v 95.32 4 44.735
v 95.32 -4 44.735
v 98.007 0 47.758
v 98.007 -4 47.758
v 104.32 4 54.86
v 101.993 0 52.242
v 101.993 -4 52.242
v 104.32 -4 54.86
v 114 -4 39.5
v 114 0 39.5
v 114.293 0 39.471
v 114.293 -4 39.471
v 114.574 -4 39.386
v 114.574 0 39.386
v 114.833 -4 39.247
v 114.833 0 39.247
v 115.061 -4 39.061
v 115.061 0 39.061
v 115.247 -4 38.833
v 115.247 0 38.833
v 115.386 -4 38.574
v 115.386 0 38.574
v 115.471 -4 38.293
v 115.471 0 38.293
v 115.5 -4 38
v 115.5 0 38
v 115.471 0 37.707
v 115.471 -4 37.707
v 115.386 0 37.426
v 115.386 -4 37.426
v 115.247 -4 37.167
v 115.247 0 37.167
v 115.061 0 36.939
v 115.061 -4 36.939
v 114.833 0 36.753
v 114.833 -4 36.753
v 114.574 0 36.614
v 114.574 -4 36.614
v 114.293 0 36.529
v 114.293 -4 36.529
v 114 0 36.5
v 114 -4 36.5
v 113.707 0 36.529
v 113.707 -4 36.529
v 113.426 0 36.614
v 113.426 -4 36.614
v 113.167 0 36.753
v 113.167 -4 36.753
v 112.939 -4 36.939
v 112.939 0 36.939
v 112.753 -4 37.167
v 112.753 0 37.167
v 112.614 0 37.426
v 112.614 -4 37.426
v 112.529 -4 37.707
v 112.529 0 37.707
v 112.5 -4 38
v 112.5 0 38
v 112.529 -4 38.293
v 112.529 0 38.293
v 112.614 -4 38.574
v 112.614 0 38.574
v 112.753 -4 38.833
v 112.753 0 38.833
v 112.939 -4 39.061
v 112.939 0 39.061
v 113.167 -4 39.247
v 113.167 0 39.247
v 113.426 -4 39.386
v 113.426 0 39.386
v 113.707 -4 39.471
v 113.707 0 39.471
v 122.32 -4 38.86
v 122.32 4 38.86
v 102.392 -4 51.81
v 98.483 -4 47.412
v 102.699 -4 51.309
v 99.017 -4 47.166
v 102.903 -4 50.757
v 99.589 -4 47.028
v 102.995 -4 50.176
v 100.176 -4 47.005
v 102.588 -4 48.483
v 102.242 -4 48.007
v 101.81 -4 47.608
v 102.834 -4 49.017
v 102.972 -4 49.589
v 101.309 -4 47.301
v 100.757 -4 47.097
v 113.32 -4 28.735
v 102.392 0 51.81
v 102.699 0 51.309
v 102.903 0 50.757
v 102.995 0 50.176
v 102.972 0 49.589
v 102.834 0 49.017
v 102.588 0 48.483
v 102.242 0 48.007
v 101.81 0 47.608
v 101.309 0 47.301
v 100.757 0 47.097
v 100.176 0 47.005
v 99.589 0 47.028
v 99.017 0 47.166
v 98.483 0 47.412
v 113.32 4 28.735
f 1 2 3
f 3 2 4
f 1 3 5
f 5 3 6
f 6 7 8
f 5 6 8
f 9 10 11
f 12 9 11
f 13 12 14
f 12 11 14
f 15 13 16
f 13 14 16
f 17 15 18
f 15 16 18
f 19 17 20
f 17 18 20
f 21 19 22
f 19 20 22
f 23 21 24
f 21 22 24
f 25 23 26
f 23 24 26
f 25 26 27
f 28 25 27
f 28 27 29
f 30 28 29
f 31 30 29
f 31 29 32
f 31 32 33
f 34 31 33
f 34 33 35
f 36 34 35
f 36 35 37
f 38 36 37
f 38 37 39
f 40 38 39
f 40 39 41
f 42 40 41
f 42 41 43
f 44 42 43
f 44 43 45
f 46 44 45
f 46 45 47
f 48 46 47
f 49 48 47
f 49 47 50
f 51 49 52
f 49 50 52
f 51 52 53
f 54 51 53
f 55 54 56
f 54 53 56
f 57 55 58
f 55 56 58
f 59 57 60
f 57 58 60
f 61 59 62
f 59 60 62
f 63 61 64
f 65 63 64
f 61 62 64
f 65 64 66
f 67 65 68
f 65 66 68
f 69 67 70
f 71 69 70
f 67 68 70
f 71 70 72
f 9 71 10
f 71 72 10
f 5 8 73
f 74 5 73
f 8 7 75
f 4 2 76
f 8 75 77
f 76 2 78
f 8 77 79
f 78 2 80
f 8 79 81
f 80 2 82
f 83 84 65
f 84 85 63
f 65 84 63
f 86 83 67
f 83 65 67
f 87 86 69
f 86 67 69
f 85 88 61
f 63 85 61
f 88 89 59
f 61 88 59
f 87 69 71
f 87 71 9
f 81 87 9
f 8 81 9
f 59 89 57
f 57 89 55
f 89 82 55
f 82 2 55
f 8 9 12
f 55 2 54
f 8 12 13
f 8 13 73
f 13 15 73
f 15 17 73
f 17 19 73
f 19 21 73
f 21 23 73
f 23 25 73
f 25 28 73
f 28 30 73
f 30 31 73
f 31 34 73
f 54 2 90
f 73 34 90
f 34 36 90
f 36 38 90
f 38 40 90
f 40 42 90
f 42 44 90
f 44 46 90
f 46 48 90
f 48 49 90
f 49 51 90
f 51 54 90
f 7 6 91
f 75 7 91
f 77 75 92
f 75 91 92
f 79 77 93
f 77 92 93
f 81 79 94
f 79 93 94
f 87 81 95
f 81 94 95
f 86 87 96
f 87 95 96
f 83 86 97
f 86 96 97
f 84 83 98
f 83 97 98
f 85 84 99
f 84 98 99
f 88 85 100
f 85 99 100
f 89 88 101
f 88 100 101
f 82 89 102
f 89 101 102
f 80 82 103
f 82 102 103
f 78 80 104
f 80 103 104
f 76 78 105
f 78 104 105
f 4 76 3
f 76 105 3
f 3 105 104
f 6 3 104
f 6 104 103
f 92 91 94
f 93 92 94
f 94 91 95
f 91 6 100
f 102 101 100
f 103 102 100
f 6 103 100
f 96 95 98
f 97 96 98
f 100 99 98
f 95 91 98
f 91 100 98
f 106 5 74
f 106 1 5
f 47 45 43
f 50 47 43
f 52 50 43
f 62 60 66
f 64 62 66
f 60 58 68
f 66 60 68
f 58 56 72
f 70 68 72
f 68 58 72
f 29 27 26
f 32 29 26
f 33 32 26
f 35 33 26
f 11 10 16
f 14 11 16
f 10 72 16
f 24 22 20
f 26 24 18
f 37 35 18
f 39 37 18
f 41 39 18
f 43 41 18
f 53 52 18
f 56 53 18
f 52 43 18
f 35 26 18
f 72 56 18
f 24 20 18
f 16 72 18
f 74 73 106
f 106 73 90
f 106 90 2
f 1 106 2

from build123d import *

# Parameters (mm, degrees)
EXTRUDE_START       = -4
EXTRUDE_1_DEPTH     = 8
SKETCH_2_R          = 3
SKETCH_2_R_2        = 1.5
CUT_EXTRUDE_1_DEPTH = 135.118611684


with BuildPart() as part:
    # 草图1 → 凸台-拉伸1 (new body)
    with BuildSketch(Plane(origin=(0, 0, 0), x_dir=(1, 0, 0), z_dir=(0, 1, 0)).offset(EXTRUDE_START)):
        Polygon((104.32, -54.86), (122.32, -38.86), (113.32, -28.735), (95.32, -44.735), align=None)
    extrude(amount=EXTRUDE_1_DEPTH)

    # 草图2 → 切除-拉伸1 (cut, through all)
    with BuildSketch(Plane(origin=(0, 0, 0), x_dir=(1, 0, 0), z_dir=(0, 1, 0))):
        with Locations((100, -50)):
            Circle(SKETCH_2_R)
        with Locations(Location((114, -38, 0), (0, 0, 270))):
            Circle(SKETCH_2_R_2)
    extrude(amount=-CUT_EXTRUDE_1_DEPTH, mode=Mode.SUBTRACT)


solid = part.part
